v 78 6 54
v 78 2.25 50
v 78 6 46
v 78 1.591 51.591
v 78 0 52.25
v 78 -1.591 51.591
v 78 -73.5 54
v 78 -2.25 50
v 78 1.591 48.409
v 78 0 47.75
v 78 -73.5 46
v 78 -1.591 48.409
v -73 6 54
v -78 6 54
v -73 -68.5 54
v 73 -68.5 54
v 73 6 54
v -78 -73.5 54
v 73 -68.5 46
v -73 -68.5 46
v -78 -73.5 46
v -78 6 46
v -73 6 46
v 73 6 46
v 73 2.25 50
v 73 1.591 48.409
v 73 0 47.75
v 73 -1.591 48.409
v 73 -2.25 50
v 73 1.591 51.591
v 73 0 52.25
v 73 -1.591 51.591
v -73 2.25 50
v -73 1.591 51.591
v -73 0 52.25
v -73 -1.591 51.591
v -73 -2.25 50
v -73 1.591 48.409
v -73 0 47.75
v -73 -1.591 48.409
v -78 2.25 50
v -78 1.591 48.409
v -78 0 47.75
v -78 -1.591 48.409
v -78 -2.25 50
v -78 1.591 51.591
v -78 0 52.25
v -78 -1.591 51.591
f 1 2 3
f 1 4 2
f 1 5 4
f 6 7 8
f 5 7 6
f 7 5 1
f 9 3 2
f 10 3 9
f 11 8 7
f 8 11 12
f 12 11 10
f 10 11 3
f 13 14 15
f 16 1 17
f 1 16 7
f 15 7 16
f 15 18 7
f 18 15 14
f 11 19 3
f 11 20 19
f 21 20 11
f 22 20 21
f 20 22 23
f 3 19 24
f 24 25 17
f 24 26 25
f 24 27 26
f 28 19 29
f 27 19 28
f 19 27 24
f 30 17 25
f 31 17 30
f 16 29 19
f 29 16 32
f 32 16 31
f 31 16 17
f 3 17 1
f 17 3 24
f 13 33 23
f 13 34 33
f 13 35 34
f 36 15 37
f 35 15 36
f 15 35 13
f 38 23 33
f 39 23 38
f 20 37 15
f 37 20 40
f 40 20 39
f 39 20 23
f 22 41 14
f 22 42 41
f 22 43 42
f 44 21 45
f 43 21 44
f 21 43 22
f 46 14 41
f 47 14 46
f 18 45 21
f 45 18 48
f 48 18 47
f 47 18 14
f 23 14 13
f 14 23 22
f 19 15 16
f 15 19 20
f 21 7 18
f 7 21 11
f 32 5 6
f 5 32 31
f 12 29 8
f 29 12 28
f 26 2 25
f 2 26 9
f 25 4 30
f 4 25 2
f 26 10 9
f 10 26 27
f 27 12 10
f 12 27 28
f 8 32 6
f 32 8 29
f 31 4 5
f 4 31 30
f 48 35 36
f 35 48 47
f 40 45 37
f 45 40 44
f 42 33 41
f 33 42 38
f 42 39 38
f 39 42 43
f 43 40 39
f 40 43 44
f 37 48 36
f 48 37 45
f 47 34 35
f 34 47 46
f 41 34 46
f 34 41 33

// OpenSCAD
// U-Bail Bracket for the table fan - side-pivot hanging/prop stand.
// Prints flat on the bed (X-Y plane), no supports. Drill the 4.5mm pivot
// holes after printing if they don't come out clean.
//
// Assembly: M4 screw through each arm into the heat-set insert in the
// housing's pivot pad. Friction pivot - tighten to taste (truck vibration).
//   - Folded: arms point down, bar nests in the groove under the base.
//   - Prop: insert an M3 screw (from your kit) in each stop-pin hole, swing
//     the bail back until the arms rest on the pins (~30 deg).
//   - Hang: pull the stop pins, swing the bail up ~100 deg, hook the bar
//     over a wall hook. The fan dangles below on the two M4 pivots.
//
// Arm centers at X=±75.5 (ride on the 3mm pivot pads); pivot holes at local
// Y=0 align with the housing pivots at (Y=0, Z=50).

bail_arm_x = 75.5;   // arm centerline |X|
bail_arm_t = 5;      // arm thickness (X)
bail_arm_w = 8;      // arm width (Z)
bail_arm_l = 71;     // pivot center to bar center
bail_bar_y = -73.5;  // bar bottom edge (nests in base groove)
bail_z0 = 46;        // arm/bar front face (Z)

module bail() {
    difference() {
        union() {
            // arms (pivot hole 6mm below the top end)
            for (sx = [1, -1])
                translate([sx*bail_arm_x - bail_arm_t/2, -bail_arm_l, bail_z0])
                    cube([bail_arm_t, bail_arm_l + 6, bail_arm_w]);
            // bottom bar joining the arms
            translate([-bail_arm_x - bail_arm_t/2, bail_bar_y, bail_z0])
                cube([2*bail_arm_x + bail_arm_t, 5, bail_arm_w]);
        }
        // pivot holes (M4 clearance)
        for (sx = [1, -1])
            translate([sx*bail_arm_x - 3, 0, 50])
                rotate([0,90,0]) cylinder(d=4.5, h=6);
    }
}

// ---------- Render ----------
bail();
